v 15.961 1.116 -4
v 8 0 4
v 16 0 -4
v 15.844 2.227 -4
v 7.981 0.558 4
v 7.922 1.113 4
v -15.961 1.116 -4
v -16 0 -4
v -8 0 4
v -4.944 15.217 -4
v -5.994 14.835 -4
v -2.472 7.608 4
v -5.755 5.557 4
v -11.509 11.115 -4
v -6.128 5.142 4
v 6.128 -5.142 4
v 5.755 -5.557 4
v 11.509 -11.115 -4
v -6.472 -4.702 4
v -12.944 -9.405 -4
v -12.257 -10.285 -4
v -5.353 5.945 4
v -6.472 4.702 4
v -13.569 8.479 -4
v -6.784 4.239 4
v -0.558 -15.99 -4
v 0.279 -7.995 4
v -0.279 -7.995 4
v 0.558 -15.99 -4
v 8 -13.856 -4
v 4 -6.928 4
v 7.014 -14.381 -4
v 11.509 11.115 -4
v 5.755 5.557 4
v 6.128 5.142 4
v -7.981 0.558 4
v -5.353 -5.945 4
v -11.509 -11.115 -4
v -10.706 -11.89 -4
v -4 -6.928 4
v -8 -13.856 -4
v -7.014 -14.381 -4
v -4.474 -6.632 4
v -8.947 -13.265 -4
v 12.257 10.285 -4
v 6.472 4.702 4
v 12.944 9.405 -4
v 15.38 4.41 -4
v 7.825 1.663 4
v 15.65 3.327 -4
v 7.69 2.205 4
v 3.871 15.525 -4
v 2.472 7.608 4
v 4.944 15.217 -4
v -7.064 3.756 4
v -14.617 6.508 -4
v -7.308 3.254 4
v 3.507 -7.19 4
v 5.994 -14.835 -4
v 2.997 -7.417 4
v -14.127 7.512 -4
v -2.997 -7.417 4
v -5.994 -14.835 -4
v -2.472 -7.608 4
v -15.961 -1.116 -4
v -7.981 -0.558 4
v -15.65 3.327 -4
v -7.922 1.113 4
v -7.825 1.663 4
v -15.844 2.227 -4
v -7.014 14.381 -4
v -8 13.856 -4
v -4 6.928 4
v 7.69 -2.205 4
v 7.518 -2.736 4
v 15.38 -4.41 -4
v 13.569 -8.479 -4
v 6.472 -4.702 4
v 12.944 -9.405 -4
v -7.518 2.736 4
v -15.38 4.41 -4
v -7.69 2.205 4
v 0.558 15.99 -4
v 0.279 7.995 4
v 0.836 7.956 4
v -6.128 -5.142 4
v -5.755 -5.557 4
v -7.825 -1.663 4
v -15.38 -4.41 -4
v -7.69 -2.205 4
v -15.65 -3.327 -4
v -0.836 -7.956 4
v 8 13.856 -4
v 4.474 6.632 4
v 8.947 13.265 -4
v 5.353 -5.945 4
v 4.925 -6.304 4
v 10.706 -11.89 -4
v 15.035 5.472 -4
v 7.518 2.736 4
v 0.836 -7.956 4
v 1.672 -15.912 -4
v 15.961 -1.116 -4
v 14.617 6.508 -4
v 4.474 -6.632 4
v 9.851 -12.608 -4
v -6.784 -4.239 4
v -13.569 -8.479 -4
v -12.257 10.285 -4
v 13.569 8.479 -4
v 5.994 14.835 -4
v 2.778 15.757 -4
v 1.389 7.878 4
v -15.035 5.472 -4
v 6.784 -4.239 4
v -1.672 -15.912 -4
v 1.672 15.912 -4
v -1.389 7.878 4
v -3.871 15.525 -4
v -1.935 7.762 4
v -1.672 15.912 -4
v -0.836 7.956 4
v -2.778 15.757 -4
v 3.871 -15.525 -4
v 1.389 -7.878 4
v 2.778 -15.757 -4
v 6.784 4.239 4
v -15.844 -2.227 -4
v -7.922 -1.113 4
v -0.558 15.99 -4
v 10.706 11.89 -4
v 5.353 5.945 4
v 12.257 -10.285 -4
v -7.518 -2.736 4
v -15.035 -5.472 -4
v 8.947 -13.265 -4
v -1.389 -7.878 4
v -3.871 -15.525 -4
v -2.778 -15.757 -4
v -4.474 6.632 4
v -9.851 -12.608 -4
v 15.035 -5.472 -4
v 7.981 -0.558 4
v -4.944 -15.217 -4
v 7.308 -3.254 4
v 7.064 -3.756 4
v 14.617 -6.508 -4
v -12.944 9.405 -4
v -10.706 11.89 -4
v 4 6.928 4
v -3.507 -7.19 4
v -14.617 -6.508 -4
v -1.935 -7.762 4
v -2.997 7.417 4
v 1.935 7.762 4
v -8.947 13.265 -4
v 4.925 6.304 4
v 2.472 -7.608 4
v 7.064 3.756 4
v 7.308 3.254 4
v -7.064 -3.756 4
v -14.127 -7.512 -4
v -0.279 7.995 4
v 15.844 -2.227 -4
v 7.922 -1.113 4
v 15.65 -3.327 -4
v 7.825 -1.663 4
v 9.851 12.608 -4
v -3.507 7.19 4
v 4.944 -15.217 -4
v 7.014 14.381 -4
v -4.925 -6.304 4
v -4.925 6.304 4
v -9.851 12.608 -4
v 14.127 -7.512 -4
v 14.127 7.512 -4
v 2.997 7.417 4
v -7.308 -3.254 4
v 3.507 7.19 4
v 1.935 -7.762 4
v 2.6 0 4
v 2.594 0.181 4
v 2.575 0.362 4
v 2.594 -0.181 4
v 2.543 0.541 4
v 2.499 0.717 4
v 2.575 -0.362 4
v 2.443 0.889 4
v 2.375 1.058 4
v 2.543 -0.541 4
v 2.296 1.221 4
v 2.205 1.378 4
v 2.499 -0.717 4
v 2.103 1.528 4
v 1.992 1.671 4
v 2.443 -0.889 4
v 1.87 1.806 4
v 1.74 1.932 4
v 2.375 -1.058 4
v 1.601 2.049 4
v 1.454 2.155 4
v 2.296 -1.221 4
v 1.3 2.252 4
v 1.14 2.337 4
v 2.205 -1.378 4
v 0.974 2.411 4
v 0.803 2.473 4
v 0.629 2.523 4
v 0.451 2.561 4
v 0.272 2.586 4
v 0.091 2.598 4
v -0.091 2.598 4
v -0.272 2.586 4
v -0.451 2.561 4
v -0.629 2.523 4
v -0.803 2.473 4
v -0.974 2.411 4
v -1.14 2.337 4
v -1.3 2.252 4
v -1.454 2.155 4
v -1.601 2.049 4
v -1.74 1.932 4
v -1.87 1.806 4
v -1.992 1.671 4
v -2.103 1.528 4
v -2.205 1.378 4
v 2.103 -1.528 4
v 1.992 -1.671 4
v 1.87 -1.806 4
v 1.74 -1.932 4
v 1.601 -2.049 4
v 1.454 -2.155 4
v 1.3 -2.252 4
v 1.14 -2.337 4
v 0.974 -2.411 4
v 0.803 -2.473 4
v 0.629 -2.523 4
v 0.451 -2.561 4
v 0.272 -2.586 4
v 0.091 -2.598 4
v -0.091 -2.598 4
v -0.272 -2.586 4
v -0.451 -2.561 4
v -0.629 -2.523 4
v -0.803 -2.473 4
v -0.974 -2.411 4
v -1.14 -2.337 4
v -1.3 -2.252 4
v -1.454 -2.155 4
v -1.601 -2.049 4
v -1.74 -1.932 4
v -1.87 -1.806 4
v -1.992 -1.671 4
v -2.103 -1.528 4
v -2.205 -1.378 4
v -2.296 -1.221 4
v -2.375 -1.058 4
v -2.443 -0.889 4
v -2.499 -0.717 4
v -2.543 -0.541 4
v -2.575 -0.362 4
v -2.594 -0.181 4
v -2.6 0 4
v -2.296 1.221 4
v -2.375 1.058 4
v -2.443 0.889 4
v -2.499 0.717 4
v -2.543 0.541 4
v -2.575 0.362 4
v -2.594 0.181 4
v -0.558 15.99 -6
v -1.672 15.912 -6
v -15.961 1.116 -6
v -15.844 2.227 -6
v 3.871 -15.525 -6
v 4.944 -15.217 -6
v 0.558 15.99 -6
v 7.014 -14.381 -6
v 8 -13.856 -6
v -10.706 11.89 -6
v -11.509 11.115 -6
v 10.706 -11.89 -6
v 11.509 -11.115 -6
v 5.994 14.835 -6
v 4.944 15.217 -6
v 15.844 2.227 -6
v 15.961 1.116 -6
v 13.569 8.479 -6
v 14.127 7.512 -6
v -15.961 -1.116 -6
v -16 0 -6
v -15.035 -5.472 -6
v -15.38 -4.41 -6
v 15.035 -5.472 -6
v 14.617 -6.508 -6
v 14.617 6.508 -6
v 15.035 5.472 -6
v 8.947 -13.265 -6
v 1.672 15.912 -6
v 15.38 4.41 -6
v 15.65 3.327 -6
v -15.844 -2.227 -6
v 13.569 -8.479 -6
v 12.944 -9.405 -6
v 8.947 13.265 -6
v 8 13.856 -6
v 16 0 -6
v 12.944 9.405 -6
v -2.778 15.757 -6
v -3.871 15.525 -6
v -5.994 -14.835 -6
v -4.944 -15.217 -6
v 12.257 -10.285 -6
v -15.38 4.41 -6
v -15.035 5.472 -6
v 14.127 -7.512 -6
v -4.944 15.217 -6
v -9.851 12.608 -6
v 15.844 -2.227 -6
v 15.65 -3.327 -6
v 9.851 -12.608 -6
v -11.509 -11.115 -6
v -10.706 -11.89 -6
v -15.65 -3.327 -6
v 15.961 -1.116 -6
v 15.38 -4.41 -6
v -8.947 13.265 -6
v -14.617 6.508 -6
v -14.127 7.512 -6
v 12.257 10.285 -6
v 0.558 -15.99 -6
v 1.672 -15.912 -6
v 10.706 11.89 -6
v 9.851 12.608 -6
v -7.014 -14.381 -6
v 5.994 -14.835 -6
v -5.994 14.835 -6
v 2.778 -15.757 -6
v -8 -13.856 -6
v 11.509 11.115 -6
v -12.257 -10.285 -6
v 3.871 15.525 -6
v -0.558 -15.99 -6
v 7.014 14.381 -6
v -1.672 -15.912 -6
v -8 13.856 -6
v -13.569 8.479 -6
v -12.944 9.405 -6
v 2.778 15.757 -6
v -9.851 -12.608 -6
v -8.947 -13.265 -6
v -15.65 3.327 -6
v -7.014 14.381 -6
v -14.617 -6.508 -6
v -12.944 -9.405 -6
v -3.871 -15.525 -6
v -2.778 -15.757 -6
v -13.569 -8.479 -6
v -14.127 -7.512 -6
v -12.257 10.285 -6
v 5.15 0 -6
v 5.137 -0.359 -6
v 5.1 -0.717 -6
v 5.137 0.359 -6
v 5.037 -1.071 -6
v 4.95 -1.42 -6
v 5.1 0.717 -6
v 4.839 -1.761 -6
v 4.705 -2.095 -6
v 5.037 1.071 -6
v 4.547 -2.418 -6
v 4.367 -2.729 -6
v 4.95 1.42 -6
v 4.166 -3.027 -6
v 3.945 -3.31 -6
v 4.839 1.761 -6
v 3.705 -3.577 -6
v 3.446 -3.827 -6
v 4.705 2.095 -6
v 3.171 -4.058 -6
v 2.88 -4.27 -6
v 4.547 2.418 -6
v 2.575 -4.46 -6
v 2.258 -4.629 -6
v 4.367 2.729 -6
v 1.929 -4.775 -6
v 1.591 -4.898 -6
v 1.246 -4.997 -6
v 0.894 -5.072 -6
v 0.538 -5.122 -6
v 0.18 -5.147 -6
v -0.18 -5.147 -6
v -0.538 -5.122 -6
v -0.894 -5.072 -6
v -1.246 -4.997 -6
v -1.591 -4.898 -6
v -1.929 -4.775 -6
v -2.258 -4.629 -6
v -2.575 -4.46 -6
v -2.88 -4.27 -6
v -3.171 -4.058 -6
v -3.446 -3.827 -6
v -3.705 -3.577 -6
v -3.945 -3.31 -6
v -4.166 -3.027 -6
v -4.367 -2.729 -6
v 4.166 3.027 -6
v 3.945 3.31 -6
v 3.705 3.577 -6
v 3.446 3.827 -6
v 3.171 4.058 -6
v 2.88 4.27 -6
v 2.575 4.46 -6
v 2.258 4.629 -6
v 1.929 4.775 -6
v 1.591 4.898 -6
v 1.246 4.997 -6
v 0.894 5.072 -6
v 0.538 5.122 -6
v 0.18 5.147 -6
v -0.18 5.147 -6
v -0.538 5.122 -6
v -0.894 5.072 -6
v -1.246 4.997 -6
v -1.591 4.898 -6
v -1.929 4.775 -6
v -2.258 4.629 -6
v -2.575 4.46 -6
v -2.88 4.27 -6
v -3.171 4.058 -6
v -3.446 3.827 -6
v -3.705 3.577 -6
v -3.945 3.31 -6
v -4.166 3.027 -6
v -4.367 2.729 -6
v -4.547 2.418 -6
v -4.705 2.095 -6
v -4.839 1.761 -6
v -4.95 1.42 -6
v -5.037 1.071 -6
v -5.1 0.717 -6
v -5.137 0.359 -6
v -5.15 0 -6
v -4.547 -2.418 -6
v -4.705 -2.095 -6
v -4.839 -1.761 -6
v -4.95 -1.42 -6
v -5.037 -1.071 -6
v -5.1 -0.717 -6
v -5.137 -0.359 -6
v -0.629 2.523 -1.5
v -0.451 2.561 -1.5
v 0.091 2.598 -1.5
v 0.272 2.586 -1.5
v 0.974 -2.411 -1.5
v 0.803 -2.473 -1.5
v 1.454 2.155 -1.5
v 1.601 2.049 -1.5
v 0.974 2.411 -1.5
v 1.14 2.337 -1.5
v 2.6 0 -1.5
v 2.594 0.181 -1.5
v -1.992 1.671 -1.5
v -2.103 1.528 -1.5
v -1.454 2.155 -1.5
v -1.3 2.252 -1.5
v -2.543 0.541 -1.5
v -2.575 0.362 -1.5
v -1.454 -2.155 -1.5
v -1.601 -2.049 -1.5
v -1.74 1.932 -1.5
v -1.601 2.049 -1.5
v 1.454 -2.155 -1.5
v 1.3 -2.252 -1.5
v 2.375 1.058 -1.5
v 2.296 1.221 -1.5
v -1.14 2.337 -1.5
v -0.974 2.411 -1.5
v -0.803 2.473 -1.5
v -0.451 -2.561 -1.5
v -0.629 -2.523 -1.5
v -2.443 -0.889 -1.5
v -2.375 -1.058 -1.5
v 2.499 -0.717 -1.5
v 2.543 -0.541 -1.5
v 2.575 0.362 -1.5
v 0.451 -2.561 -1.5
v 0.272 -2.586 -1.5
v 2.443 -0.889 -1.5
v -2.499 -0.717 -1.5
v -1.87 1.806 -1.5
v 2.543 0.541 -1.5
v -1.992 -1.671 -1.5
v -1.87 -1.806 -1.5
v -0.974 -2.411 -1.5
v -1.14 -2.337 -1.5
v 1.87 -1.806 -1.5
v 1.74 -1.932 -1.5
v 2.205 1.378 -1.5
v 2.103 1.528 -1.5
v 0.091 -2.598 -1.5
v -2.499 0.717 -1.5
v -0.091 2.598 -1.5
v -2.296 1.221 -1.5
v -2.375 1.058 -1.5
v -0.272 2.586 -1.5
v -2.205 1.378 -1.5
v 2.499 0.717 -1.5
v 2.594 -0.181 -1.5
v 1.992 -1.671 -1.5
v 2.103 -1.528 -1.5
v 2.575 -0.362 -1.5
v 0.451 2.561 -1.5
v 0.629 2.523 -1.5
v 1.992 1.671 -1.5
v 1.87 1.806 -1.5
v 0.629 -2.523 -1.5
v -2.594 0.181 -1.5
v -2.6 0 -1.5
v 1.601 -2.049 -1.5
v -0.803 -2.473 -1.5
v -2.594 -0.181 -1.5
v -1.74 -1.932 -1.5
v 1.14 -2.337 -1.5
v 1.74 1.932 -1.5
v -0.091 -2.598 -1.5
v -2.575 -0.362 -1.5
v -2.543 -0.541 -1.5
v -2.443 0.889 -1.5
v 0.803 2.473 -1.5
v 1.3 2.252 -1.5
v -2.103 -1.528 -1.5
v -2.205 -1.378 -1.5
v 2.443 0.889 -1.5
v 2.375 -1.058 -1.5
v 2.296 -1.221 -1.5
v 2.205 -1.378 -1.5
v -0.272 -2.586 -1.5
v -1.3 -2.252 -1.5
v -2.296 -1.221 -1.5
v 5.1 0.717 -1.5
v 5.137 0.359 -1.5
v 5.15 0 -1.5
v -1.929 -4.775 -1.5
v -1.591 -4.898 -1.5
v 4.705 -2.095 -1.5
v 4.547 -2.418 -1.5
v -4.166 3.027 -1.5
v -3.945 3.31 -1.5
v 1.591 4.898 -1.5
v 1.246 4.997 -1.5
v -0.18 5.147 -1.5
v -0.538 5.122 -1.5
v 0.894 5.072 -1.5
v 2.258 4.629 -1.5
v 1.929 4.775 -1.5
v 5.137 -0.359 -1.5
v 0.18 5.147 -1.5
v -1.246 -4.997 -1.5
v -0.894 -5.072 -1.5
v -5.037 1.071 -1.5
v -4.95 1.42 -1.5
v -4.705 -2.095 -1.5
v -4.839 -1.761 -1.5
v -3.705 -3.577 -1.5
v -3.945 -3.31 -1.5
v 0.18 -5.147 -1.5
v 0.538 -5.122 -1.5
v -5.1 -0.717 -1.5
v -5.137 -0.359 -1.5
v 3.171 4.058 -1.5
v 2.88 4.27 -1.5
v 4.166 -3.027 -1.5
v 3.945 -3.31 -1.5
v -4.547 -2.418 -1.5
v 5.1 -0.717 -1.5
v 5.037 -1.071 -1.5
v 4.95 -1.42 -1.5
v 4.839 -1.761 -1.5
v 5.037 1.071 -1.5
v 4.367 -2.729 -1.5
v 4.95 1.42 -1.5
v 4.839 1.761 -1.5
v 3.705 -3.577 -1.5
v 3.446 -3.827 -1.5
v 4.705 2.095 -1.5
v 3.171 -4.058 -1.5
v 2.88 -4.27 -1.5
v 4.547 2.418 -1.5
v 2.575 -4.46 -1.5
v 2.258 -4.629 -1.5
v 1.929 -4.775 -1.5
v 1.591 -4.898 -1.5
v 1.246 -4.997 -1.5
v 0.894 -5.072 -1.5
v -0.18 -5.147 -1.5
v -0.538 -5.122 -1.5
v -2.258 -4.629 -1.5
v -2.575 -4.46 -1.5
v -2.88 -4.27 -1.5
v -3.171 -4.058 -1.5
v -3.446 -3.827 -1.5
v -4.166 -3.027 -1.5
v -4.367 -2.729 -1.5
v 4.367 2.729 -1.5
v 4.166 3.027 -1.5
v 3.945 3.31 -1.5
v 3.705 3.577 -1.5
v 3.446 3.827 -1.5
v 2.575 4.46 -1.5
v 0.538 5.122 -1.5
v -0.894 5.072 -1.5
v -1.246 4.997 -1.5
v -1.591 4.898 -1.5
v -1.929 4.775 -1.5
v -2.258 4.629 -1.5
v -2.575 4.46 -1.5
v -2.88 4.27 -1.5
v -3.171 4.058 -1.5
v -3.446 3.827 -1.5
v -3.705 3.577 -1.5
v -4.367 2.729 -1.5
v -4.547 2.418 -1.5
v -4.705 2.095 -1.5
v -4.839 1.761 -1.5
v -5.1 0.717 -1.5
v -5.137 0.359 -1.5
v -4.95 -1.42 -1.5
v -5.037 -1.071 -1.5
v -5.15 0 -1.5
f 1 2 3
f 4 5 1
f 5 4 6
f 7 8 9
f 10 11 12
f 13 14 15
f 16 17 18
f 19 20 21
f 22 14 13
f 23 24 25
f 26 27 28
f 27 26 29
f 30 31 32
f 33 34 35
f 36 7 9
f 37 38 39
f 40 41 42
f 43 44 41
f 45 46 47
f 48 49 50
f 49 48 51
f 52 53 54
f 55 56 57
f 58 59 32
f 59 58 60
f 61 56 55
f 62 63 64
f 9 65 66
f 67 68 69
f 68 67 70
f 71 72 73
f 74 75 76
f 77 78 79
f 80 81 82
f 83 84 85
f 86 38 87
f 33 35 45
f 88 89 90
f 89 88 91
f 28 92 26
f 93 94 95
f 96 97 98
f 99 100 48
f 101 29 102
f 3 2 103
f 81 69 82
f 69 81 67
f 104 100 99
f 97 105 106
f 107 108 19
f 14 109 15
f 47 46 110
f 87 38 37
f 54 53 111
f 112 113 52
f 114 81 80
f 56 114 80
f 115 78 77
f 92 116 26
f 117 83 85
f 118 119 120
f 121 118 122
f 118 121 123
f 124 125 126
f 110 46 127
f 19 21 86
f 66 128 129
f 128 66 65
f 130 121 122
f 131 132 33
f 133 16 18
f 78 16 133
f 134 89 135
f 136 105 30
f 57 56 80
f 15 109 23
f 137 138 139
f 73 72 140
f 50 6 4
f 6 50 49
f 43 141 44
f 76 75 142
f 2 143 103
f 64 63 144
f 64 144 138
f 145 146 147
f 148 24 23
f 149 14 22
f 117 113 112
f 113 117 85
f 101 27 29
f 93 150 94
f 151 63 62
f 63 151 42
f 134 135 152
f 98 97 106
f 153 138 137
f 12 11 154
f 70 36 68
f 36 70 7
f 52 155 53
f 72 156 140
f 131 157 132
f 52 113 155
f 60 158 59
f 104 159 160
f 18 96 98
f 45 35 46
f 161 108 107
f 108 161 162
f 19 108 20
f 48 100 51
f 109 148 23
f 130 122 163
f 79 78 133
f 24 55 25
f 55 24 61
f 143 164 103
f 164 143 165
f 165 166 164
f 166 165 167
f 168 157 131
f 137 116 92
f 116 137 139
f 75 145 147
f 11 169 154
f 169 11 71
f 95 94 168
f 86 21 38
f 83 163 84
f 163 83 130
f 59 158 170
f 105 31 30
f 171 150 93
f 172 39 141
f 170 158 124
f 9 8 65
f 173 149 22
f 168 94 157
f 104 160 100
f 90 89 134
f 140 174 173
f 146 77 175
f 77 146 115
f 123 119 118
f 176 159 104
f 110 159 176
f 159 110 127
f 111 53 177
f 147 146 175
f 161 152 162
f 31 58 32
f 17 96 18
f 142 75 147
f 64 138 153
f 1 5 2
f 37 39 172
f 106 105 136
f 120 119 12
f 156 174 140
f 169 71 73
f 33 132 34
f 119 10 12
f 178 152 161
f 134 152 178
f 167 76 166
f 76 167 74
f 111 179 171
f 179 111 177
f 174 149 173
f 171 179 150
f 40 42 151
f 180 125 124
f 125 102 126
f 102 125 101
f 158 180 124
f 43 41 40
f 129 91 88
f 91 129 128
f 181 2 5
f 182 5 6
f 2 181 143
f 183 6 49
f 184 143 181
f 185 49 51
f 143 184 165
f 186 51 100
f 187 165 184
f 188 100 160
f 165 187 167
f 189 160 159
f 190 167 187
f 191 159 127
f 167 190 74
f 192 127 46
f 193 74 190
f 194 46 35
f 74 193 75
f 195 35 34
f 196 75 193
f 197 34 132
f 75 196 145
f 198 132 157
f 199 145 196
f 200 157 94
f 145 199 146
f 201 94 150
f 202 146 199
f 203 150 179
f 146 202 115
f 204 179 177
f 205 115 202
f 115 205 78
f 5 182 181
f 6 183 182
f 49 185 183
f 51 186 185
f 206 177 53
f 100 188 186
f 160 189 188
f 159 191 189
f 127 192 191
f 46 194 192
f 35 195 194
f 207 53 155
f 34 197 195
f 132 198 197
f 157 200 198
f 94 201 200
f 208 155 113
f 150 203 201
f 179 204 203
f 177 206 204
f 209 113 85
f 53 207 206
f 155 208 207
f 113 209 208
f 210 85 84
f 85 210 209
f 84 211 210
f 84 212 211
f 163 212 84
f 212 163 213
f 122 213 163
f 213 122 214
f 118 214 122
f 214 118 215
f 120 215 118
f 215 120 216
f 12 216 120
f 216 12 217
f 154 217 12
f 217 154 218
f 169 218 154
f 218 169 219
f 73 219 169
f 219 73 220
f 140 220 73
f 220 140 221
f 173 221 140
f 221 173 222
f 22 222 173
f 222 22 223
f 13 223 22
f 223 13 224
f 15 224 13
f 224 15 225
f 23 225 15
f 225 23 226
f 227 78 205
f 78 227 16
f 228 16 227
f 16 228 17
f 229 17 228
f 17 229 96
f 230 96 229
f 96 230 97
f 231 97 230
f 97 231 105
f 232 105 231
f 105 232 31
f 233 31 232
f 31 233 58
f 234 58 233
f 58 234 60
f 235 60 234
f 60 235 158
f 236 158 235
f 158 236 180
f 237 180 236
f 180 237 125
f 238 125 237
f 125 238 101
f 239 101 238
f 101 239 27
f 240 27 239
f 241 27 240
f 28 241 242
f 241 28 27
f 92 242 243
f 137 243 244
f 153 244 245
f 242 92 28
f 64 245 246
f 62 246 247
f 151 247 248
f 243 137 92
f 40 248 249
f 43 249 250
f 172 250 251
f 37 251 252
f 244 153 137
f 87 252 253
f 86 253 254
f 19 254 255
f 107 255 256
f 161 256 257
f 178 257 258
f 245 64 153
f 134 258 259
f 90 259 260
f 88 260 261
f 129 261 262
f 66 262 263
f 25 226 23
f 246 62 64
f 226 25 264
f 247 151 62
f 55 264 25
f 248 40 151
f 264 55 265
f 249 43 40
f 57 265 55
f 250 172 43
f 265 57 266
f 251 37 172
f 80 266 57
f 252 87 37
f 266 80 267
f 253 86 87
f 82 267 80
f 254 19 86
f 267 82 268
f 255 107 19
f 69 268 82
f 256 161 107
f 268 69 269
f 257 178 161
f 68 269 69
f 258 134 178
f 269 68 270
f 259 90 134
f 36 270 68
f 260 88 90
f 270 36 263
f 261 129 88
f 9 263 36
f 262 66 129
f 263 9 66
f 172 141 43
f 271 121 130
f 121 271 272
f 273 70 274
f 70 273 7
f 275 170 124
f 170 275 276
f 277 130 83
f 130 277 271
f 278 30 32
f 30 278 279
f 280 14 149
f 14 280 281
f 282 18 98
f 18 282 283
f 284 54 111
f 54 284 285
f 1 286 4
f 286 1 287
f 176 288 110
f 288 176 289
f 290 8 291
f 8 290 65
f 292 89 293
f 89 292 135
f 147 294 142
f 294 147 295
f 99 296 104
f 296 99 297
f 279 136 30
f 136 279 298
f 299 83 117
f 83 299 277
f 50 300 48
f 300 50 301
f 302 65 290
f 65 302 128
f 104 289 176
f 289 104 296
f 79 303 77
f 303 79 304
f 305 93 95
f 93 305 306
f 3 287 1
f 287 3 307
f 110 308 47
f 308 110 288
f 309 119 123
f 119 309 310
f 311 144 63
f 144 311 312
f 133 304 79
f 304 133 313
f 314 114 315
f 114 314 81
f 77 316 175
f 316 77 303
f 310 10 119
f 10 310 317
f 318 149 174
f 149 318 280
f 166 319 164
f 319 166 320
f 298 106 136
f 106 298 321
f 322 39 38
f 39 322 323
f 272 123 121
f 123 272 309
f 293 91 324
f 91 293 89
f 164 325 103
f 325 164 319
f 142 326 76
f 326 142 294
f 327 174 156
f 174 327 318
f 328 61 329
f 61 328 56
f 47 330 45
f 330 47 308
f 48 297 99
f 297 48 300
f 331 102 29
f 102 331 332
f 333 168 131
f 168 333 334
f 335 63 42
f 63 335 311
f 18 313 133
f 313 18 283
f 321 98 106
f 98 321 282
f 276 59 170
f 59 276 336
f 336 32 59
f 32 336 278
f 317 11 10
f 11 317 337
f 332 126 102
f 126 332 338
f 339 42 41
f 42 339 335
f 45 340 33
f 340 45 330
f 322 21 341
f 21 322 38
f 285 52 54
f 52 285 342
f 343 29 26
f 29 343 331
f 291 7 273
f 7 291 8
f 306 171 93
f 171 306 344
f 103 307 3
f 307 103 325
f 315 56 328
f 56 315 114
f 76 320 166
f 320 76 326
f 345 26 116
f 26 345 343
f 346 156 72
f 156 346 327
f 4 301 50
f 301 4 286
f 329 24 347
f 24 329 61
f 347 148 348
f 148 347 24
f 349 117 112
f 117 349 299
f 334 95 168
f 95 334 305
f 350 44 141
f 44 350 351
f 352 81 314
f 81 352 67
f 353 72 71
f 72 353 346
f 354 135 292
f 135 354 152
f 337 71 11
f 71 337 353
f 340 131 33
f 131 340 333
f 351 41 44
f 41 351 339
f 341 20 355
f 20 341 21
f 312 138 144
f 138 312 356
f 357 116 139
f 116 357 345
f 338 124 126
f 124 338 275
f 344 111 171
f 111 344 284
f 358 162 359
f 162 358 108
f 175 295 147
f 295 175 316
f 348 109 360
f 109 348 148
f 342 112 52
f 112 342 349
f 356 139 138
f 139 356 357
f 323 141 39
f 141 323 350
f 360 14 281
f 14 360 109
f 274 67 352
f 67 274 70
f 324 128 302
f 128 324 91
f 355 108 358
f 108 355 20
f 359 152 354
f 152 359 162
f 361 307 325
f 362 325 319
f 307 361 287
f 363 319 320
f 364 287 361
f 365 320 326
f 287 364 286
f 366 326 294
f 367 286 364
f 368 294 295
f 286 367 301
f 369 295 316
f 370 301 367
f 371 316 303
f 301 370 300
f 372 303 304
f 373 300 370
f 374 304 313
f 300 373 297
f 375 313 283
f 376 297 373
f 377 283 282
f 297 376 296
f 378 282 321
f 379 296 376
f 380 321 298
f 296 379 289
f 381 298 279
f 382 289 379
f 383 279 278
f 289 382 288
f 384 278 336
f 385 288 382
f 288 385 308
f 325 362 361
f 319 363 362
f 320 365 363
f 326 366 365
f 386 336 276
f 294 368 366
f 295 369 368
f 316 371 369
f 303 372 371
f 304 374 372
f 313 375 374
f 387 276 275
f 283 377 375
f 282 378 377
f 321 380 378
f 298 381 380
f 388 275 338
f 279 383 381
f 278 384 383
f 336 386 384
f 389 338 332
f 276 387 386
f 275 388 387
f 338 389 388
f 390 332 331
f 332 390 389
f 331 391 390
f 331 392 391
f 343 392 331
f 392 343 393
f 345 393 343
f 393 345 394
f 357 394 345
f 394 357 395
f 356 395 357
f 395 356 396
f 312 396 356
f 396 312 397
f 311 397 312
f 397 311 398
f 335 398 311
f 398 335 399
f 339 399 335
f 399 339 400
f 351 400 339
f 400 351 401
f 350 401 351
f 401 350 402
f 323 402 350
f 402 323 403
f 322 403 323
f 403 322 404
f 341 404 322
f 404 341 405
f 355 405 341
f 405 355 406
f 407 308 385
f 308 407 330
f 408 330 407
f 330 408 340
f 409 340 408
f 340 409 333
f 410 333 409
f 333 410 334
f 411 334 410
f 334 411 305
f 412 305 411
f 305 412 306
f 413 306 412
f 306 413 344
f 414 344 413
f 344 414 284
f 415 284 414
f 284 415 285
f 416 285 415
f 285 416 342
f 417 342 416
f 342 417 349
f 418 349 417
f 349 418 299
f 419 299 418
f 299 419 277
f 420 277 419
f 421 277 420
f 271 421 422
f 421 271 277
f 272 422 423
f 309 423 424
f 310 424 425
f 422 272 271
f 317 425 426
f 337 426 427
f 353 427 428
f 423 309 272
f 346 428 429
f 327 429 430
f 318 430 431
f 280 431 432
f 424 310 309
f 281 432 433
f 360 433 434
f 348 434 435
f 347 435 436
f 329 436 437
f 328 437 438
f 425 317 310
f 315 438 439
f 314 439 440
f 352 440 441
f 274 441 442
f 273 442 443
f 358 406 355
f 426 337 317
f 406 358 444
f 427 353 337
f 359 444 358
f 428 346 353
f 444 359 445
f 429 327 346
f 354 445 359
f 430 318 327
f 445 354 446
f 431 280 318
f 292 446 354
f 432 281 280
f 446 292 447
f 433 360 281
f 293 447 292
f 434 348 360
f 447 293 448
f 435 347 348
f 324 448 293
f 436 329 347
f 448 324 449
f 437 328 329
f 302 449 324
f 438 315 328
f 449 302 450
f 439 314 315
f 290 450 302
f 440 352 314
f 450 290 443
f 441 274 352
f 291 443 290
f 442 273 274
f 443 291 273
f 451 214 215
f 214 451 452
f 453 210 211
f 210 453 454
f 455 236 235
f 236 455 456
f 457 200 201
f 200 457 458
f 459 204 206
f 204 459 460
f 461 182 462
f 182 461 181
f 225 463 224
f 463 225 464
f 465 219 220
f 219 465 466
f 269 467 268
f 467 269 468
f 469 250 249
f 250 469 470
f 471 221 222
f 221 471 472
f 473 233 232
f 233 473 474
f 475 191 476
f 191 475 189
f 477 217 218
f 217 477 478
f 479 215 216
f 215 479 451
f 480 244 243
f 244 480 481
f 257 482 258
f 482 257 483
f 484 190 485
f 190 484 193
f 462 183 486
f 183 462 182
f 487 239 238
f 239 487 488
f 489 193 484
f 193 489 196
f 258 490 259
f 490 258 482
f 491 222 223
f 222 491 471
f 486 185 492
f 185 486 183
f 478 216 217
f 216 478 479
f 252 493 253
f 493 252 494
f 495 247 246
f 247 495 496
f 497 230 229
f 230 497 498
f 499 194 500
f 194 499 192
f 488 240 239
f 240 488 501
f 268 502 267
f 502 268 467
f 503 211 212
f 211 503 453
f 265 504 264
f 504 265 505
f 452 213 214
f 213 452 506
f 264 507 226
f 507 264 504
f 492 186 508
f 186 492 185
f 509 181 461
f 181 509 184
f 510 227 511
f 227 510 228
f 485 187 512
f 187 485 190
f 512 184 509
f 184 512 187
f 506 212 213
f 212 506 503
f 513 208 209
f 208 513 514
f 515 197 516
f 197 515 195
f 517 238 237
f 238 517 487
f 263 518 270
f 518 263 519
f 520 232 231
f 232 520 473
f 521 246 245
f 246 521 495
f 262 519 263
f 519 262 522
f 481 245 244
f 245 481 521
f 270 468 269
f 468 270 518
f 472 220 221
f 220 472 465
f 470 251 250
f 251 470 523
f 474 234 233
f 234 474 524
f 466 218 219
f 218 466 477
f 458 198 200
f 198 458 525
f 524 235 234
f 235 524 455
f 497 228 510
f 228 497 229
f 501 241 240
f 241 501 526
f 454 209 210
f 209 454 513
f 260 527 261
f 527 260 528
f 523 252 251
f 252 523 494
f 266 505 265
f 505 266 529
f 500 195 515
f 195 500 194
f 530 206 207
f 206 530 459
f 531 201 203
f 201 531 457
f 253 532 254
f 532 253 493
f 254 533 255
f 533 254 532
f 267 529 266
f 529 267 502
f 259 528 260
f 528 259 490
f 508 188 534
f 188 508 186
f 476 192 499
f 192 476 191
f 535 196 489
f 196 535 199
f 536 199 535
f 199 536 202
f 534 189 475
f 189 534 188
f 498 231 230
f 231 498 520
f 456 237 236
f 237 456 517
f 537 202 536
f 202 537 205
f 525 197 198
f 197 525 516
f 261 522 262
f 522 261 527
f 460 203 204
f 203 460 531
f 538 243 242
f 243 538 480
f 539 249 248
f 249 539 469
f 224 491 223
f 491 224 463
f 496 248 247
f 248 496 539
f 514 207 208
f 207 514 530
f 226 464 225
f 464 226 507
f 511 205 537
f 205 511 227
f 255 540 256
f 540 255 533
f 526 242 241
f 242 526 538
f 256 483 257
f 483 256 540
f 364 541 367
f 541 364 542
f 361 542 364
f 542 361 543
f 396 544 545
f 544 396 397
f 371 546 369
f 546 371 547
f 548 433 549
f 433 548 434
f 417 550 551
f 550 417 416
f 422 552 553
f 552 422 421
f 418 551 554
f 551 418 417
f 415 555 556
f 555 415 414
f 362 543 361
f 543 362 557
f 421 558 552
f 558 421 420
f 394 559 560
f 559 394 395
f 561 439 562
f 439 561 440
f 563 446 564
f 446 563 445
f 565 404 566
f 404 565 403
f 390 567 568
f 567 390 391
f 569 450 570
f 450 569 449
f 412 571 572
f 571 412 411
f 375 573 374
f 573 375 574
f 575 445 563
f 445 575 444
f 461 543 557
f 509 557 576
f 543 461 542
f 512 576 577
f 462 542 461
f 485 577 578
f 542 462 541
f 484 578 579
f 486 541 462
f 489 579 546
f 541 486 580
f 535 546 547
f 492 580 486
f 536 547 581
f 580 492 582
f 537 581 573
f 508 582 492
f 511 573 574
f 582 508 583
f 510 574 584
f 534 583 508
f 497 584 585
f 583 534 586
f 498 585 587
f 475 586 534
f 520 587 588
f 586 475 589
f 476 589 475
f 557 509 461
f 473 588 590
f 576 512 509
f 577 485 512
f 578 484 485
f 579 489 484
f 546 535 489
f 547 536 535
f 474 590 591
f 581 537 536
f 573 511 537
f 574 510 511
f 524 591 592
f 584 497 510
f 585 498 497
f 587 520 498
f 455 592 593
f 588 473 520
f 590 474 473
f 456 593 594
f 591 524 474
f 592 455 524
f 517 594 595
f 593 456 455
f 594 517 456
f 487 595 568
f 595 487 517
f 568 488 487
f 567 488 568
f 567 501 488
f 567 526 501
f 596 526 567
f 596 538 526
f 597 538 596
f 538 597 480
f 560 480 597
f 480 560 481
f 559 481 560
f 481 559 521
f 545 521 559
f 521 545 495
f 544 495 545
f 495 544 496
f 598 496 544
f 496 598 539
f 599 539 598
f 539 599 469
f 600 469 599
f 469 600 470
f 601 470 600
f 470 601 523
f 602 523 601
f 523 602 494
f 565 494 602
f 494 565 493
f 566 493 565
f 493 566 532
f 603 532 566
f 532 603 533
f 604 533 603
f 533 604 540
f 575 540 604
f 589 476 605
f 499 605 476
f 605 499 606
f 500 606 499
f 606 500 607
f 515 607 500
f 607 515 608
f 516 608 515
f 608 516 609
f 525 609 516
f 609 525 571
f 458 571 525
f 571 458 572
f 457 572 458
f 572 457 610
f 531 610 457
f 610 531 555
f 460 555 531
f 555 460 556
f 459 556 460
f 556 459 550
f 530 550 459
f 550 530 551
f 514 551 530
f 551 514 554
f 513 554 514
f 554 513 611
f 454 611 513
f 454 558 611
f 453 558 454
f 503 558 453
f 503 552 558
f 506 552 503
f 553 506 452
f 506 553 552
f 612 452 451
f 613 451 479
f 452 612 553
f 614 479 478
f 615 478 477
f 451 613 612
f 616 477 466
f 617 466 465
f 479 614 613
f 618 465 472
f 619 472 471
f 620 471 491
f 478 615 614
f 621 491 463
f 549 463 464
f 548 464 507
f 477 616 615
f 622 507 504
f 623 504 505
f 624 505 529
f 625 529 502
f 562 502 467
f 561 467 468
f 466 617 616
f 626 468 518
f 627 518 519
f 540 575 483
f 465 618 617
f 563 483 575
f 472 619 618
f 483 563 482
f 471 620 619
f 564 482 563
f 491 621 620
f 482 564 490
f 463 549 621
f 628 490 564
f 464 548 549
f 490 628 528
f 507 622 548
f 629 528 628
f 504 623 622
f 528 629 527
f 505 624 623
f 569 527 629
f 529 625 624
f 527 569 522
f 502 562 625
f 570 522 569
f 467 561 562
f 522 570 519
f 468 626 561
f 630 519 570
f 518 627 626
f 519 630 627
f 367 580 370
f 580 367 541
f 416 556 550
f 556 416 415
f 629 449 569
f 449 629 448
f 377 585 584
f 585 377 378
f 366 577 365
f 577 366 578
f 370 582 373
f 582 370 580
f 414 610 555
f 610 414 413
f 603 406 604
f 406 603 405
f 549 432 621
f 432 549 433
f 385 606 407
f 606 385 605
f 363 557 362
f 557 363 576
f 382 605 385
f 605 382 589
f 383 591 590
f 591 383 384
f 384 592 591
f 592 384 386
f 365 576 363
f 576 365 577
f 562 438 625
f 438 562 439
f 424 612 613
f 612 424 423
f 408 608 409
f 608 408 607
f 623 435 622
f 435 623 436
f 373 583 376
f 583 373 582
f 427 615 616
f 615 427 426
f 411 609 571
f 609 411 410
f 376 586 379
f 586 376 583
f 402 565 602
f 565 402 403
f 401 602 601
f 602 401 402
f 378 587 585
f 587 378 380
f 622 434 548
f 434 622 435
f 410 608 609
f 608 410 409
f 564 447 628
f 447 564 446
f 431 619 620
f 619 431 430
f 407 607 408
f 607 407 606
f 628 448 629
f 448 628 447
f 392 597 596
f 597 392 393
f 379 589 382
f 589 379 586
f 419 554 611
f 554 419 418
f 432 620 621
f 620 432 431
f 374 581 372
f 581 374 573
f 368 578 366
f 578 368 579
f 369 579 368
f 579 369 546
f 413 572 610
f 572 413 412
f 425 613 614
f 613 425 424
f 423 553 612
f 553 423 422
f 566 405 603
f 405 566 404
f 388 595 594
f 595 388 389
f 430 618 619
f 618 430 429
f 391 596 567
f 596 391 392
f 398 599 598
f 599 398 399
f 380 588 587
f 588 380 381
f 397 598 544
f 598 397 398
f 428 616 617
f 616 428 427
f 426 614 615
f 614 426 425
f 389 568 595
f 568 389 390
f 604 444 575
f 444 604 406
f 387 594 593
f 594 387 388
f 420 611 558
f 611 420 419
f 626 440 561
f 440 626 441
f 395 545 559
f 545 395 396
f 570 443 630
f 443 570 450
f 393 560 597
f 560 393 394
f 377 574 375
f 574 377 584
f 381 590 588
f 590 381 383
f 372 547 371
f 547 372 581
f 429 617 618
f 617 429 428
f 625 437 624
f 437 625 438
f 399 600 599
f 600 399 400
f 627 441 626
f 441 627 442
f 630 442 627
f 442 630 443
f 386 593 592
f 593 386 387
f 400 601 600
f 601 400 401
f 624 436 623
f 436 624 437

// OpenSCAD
$fn=90;

difference(){
    body();
    cylinder(12,d=5.2,center=true);
    translate([0,0,-4]) #cylinder(5,d=10.3,center=true);
}

module body(){
cylinder(8,d1=32,d2=16,center=true);
translate([0,0,-5]) cylinder(2,d=32,center=true);
}
